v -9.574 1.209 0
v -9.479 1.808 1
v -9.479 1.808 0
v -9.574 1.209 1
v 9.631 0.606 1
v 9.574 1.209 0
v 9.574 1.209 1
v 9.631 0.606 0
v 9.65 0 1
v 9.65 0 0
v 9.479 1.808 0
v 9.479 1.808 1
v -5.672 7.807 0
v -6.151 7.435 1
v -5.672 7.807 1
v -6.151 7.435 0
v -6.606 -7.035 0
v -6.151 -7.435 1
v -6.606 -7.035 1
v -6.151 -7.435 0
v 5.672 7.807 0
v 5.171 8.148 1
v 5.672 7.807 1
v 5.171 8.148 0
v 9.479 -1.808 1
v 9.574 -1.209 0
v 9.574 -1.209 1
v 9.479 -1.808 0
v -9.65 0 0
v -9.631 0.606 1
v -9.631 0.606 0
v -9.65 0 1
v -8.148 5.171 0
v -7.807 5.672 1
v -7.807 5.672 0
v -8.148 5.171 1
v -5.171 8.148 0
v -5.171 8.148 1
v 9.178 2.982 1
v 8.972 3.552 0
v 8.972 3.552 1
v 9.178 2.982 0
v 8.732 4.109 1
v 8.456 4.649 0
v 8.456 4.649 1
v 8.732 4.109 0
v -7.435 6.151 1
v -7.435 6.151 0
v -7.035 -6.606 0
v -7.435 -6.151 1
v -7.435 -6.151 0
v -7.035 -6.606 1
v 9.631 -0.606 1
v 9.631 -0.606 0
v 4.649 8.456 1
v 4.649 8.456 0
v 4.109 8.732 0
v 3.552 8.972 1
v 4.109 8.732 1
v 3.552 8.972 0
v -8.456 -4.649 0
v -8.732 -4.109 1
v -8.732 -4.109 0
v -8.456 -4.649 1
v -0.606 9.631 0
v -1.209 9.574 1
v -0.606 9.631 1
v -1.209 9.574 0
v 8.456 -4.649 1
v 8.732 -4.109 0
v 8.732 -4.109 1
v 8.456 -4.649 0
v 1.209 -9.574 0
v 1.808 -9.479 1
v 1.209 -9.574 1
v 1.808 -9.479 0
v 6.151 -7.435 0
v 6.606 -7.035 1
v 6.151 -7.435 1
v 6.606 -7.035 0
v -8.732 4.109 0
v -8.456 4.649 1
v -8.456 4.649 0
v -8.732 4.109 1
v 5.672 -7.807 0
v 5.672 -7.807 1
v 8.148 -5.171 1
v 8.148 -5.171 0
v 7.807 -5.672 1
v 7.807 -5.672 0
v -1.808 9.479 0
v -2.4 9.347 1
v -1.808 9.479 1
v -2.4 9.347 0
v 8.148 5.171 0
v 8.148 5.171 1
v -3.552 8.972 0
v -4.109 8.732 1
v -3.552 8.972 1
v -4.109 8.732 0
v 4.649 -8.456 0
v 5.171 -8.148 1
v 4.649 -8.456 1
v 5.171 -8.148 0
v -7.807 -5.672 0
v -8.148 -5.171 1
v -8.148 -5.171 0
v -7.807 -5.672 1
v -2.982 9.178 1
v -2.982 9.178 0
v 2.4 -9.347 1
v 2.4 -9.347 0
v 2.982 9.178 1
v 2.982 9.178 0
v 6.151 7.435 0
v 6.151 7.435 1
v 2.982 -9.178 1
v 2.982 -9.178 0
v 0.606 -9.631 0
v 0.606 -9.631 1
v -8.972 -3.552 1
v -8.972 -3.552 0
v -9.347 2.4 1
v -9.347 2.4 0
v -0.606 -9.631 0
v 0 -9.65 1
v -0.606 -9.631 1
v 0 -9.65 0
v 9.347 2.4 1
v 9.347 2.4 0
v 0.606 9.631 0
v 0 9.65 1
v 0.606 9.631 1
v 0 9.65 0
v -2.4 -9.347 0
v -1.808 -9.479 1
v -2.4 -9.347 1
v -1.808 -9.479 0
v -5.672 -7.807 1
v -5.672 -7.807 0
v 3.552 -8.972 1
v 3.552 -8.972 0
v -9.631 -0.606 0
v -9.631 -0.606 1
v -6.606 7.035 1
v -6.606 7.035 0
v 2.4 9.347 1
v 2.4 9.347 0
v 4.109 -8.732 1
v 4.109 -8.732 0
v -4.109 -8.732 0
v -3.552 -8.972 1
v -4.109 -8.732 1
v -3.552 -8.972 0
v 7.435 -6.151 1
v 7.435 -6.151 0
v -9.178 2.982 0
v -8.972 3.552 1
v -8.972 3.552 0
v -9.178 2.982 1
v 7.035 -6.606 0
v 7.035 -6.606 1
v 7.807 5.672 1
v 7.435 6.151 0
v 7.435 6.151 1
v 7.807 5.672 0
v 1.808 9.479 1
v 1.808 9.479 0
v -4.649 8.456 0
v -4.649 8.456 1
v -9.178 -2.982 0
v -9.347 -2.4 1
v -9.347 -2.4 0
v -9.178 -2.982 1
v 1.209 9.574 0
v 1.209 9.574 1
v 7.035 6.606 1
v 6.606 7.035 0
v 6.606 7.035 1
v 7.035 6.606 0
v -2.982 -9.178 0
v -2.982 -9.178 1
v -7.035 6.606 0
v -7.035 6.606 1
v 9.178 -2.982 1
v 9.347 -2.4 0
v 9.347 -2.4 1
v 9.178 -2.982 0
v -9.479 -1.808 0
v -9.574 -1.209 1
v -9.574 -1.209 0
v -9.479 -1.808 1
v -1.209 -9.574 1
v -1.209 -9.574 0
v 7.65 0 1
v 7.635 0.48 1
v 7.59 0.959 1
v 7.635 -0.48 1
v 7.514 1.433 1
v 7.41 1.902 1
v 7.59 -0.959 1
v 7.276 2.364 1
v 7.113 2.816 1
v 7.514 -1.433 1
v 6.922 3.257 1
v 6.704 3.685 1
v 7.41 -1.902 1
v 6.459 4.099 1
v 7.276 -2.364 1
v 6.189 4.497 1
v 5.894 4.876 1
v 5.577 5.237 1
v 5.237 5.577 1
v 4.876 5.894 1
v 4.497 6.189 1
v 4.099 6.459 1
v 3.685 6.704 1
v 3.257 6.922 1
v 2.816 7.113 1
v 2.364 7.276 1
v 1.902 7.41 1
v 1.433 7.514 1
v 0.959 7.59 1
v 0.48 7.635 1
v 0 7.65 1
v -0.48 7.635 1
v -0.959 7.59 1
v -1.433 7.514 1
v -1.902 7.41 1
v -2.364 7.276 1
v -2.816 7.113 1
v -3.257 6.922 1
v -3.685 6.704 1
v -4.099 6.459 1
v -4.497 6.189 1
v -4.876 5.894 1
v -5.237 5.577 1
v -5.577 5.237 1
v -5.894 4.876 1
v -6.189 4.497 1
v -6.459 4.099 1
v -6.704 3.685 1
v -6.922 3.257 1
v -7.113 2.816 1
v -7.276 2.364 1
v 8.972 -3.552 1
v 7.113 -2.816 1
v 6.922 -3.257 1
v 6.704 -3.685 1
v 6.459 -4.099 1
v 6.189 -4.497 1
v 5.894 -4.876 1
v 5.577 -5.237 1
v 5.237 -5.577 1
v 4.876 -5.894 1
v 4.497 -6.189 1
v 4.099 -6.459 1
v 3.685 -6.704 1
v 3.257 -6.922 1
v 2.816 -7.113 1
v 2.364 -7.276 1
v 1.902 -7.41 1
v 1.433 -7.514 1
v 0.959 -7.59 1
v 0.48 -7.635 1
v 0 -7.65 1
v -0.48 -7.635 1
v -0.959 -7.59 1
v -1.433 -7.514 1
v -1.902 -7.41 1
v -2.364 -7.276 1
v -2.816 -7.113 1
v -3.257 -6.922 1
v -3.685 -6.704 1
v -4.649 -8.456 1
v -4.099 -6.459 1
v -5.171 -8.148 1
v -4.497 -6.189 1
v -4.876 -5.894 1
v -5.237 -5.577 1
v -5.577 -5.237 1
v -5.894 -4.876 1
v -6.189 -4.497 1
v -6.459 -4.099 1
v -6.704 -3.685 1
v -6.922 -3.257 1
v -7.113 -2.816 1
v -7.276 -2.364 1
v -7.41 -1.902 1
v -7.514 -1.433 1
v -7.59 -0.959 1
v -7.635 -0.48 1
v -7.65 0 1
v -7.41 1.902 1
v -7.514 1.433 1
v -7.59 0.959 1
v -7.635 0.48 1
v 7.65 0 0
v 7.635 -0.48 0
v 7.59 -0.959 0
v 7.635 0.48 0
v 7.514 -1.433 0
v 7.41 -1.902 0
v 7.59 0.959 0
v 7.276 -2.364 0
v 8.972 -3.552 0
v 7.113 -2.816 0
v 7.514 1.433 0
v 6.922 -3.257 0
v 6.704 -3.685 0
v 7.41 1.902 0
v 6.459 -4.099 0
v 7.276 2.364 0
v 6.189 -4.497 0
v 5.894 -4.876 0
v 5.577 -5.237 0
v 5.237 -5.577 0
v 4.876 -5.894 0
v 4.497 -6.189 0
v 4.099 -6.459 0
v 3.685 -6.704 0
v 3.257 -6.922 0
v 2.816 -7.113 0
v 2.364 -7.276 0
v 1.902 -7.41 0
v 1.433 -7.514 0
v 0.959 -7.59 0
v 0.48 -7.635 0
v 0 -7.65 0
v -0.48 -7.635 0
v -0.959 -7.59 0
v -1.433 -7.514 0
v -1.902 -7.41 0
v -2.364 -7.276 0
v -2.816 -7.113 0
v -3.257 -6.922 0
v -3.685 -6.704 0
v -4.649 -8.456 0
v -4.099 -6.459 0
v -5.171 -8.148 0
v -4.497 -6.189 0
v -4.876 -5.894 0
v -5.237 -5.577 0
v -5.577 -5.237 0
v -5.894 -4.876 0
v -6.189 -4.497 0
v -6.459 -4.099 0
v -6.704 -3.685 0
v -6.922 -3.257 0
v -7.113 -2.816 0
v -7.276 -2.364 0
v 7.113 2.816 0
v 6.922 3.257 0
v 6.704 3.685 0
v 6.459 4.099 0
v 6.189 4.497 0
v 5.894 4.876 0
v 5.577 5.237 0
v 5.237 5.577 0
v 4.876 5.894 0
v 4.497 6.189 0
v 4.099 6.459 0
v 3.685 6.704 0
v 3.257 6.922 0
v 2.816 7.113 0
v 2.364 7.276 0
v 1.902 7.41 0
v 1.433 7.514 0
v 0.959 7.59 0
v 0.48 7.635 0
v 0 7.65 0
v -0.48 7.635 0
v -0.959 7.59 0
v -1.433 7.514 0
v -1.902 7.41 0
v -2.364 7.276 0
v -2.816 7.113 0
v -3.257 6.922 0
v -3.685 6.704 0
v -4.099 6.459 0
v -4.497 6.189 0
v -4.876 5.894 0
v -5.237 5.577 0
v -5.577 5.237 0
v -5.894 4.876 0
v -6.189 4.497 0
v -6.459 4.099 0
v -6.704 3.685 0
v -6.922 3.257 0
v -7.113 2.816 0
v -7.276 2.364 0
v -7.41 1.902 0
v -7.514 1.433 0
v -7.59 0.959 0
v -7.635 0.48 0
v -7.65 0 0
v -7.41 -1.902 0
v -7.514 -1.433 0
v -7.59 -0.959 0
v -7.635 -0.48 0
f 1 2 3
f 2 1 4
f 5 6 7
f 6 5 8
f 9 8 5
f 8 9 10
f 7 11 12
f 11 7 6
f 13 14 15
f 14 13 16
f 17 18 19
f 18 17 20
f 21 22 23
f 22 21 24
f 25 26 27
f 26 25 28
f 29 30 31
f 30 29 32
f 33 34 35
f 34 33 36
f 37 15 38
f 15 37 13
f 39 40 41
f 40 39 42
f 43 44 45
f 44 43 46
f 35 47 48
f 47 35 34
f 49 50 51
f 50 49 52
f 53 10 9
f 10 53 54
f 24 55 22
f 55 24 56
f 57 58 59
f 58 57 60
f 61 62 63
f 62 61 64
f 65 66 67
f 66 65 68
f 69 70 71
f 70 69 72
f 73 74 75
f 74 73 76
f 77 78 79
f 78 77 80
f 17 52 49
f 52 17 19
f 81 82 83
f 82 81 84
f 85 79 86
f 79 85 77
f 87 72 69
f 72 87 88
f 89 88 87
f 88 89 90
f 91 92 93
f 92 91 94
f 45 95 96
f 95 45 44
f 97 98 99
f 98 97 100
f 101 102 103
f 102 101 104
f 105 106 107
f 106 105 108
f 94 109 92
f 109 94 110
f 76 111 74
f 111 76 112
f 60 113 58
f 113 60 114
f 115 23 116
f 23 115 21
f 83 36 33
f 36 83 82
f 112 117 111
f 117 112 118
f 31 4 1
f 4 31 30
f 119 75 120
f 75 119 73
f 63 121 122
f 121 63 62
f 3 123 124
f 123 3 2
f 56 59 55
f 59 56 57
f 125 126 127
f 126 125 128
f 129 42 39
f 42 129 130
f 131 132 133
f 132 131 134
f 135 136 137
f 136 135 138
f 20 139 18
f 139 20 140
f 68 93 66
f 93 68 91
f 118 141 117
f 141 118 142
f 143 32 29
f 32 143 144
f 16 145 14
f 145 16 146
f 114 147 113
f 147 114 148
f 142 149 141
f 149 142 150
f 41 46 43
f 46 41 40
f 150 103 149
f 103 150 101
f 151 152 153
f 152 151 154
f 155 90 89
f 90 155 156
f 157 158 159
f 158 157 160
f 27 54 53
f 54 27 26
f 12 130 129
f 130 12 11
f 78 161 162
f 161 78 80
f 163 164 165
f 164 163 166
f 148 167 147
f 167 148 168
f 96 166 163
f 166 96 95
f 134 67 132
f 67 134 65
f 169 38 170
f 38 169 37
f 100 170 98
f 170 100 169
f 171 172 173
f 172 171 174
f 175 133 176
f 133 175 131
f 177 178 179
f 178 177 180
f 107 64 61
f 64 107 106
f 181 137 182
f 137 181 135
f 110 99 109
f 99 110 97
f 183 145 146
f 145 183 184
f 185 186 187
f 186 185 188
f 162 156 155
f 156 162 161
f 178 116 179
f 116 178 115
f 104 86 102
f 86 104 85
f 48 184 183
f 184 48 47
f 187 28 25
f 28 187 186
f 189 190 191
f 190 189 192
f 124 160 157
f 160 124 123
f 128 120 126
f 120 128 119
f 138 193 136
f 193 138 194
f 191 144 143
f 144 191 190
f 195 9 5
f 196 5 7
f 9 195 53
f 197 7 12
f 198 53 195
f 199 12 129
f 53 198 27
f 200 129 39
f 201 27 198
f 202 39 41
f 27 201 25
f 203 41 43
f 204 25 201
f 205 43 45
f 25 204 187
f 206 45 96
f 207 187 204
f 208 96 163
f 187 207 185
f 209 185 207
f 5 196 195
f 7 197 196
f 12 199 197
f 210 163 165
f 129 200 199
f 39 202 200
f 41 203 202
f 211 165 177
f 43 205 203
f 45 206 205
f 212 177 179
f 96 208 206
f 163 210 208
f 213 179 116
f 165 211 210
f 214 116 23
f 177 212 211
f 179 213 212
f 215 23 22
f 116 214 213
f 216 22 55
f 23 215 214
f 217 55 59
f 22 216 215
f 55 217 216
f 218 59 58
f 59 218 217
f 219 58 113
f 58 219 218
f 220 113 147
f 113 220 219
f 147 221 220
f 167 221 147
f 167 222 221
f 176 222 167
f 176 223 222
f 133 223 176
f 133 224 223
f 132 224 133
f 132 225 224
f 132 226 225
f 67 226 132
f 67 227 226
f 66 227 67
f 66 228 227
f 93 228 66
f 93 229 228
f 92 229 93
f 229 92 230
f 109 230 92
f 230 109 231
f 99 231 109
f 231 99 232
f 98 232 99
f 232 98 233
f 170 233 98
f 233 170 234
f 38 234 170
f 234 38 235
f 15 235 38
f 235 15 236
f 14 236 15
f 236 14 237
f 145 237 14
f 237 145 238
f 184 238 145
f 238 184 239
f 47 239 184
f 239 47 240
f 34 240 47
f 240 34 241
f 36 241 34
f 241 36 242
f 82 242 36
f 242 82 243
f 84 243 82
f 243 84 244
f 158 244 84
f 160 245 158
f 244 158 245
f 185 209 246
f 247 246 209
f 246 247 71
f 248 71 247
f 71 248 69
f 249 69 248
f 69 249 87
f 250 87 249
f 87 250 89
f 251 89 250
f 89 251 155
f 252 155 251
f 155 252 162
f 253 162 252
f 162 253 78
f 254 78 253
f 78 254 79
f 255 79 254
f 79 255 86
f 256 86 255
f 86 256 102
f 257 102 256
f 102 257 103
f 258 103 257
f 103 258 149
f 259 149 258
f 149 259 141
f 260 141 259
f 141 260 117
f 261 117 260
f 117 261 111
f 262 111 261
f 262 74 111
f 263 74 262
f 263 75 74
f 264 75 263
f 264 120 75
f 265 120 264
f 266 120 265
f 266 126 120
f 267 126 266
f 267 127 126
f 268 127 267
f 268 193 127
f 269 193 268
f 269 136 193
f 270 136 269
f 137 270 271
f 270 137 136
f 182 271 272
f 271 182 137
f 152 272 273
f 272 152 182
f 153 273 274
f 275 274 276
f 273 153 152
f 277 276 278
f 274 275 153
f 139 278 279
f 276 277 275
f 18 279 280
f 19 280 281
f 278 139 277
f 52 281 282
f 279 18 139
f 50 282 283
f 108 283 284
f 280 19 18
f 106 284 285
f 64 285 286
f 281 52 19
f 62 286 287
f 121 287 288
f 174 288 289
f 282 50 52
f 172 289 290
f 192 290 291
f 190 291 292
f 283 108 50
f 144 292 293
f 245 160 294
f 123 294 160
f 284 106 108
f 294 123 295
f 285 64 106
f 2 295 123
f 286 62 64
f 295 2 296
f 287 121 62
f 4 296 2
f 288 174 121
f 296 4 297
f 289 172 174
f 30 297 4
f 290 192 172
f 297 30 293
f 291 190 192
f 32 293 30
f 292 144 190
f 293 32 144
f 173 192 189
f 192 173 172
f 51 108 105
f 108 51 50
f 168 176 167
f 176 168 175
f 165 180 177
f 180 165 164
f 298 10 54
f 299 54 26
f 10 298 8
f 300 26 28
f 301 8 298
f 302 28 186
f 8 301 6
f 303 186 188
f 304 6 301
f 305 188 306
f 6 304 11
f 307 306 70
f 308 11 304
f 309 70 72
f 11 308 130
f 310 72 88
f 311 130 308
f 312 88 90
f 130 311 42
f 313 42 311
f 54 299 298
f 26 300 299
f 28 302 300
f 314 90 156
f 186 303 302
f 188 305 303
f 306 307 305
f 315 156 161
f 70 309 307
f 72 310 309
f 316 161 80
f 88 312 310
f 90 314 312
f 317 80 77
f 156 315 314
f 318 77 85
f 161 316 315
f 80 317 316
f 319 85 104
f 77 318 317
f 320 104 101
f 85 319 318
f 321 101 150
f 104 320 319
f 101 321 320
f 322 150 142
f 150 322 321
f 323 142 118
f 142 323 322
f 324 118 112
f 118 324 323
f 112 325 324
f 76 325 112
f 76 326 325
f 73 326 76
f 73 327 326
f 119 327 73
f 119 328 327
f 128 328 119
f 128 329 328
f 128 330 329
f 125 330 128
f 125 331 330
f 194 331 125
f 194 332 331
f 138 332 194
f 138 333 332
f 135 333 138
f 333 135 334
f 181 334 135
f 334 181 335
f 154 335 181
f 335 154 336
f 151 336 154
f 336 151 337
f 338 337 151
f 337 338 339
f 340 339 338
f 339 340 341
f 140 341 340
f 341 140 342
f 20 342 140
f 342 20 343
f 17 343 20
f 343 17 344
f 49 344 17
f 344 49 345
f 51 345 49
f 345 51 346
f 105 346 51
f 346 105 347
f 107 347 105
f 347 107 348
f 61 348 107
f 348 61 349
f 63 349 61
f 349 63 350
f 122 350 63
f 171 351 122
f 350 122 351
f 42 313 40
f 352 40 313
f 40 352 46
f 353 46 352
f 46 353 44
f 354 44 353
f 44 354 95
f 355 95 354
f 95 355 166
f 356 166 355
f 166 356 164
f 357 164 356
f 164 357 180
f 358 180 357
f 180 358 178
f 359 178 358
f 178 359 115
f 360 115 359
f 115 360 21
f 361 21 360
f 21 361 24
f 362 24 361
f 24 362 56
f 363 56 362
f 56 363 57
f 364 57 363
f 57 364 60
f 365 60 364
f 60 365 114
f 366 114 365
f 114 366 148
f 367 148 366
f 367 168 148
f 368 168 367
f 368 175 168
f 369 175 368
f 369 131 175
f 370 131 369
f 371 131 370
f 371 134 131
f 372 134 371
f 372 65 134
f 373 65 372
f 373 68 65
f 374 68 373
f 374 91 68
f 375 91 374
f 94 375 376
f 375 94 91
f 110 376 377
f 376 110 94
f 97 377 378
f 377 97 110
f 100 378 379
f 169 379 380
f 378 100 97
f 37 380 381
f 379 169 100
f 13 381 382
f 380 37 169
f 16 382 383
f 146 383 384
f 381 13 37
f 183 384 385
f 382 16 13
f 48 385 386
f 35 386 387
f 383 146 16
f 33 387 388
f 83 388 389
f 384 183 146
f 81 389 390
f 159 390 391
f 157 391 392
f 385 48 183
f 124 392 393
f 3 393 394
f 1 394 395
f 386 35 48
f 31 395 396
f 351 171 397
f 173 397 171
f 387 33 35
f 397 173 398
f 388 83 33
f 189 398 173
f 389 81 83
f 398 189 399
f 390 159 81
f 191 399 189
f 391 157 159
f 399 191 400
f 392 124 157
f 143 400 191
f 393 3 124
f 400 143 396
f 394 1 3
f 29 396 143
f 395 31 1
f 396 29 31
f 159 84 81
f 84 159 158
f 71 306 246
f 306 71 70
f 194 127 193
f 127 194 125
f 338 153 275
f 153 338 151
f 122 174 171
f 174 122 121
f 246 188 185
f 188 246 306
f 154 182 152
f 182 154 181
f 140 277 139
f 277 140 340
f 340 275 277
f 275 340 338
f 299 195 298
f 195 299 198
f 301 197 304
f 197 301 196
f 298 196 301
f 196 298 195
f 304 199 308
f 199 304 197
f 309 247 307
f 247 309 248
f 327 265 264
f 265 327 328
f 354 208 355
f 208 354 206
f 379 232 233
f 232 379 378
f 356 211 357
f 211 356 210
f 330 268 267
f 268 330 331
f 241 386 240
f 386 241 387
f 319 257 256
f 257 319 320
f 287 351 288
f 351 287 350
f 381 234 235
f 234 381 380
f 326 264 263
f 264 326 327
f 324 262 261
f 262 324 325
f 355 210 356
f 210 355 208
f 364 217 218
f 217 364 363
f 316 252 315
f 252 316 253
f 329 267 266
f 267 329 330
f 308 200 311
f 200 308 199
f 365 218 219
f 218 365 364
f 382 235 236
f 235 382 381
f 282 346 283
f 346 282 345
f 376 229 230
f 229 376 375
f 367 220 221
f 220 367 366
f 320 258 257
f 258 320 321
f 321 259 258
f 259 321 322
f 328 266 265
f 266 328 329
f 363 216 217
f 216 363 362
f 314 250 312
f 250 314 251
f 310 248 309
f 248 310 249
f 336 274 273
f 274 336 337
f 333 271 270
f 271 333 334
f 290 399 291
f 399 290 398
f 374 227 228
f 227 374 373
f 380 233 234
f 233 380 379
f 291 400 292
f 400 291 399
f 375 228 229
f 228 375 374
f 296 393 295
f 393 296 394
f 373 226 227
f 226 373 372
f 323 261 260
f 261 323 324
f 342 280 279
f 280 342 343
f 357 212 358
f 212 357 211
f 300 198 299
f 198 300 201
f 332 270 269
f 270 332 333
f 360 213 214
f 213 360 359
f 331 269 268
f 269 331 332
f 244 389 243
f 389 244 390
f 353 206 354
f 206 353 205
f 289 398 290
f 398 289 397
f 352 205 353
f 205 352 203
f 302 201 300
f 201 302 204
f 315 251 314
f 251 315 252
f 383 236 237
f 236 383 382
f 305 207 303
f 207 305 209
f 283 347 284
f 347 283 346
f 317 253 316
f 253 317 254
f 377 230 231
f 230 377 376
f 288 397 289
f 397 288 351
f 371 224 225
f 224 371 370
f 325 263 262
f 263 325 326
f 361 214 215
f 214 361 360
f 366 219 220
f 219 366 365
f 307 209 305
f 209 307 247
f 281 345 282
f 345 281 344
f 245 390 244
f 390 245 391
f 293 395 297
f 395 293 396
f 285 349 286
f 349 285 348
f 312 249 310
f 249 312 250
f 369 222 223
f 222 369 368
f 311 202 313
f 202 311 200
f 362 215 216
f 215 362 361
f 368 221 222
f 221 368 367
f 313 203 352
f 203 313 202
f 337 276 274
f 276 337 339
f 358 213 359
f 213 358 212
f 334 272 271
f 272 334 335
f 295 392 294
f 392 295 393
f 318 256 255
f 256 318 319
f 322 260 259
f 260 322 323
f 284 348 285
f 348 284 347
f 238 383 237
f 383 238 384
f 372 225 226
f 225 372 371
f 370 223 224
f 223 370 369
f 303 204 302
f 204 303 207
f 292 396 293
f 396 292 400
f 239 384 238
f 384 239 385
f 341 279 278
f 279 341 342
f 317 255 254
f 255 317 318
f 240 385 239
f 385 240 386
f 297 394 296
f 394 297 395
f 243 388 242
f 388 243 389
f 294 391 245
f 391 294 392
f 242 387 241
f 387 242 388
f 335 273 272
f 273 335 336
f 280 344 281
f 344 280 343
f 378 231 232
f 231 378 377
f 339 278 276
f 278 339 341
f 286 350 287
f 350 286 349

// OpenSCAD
$fn=100;

module rotor1_4() {
    margin = 0.3;
    thread_diameter = 15 + margin;
    height = 1;
    difference() {
        translate([0, 0, height/2])
        cylinder(r=thread_diameter/2+2,h=height,center=true);
        cylinder(r=thread_diameter/2,h=100,center=true);
    }
}
rotor1_4();
